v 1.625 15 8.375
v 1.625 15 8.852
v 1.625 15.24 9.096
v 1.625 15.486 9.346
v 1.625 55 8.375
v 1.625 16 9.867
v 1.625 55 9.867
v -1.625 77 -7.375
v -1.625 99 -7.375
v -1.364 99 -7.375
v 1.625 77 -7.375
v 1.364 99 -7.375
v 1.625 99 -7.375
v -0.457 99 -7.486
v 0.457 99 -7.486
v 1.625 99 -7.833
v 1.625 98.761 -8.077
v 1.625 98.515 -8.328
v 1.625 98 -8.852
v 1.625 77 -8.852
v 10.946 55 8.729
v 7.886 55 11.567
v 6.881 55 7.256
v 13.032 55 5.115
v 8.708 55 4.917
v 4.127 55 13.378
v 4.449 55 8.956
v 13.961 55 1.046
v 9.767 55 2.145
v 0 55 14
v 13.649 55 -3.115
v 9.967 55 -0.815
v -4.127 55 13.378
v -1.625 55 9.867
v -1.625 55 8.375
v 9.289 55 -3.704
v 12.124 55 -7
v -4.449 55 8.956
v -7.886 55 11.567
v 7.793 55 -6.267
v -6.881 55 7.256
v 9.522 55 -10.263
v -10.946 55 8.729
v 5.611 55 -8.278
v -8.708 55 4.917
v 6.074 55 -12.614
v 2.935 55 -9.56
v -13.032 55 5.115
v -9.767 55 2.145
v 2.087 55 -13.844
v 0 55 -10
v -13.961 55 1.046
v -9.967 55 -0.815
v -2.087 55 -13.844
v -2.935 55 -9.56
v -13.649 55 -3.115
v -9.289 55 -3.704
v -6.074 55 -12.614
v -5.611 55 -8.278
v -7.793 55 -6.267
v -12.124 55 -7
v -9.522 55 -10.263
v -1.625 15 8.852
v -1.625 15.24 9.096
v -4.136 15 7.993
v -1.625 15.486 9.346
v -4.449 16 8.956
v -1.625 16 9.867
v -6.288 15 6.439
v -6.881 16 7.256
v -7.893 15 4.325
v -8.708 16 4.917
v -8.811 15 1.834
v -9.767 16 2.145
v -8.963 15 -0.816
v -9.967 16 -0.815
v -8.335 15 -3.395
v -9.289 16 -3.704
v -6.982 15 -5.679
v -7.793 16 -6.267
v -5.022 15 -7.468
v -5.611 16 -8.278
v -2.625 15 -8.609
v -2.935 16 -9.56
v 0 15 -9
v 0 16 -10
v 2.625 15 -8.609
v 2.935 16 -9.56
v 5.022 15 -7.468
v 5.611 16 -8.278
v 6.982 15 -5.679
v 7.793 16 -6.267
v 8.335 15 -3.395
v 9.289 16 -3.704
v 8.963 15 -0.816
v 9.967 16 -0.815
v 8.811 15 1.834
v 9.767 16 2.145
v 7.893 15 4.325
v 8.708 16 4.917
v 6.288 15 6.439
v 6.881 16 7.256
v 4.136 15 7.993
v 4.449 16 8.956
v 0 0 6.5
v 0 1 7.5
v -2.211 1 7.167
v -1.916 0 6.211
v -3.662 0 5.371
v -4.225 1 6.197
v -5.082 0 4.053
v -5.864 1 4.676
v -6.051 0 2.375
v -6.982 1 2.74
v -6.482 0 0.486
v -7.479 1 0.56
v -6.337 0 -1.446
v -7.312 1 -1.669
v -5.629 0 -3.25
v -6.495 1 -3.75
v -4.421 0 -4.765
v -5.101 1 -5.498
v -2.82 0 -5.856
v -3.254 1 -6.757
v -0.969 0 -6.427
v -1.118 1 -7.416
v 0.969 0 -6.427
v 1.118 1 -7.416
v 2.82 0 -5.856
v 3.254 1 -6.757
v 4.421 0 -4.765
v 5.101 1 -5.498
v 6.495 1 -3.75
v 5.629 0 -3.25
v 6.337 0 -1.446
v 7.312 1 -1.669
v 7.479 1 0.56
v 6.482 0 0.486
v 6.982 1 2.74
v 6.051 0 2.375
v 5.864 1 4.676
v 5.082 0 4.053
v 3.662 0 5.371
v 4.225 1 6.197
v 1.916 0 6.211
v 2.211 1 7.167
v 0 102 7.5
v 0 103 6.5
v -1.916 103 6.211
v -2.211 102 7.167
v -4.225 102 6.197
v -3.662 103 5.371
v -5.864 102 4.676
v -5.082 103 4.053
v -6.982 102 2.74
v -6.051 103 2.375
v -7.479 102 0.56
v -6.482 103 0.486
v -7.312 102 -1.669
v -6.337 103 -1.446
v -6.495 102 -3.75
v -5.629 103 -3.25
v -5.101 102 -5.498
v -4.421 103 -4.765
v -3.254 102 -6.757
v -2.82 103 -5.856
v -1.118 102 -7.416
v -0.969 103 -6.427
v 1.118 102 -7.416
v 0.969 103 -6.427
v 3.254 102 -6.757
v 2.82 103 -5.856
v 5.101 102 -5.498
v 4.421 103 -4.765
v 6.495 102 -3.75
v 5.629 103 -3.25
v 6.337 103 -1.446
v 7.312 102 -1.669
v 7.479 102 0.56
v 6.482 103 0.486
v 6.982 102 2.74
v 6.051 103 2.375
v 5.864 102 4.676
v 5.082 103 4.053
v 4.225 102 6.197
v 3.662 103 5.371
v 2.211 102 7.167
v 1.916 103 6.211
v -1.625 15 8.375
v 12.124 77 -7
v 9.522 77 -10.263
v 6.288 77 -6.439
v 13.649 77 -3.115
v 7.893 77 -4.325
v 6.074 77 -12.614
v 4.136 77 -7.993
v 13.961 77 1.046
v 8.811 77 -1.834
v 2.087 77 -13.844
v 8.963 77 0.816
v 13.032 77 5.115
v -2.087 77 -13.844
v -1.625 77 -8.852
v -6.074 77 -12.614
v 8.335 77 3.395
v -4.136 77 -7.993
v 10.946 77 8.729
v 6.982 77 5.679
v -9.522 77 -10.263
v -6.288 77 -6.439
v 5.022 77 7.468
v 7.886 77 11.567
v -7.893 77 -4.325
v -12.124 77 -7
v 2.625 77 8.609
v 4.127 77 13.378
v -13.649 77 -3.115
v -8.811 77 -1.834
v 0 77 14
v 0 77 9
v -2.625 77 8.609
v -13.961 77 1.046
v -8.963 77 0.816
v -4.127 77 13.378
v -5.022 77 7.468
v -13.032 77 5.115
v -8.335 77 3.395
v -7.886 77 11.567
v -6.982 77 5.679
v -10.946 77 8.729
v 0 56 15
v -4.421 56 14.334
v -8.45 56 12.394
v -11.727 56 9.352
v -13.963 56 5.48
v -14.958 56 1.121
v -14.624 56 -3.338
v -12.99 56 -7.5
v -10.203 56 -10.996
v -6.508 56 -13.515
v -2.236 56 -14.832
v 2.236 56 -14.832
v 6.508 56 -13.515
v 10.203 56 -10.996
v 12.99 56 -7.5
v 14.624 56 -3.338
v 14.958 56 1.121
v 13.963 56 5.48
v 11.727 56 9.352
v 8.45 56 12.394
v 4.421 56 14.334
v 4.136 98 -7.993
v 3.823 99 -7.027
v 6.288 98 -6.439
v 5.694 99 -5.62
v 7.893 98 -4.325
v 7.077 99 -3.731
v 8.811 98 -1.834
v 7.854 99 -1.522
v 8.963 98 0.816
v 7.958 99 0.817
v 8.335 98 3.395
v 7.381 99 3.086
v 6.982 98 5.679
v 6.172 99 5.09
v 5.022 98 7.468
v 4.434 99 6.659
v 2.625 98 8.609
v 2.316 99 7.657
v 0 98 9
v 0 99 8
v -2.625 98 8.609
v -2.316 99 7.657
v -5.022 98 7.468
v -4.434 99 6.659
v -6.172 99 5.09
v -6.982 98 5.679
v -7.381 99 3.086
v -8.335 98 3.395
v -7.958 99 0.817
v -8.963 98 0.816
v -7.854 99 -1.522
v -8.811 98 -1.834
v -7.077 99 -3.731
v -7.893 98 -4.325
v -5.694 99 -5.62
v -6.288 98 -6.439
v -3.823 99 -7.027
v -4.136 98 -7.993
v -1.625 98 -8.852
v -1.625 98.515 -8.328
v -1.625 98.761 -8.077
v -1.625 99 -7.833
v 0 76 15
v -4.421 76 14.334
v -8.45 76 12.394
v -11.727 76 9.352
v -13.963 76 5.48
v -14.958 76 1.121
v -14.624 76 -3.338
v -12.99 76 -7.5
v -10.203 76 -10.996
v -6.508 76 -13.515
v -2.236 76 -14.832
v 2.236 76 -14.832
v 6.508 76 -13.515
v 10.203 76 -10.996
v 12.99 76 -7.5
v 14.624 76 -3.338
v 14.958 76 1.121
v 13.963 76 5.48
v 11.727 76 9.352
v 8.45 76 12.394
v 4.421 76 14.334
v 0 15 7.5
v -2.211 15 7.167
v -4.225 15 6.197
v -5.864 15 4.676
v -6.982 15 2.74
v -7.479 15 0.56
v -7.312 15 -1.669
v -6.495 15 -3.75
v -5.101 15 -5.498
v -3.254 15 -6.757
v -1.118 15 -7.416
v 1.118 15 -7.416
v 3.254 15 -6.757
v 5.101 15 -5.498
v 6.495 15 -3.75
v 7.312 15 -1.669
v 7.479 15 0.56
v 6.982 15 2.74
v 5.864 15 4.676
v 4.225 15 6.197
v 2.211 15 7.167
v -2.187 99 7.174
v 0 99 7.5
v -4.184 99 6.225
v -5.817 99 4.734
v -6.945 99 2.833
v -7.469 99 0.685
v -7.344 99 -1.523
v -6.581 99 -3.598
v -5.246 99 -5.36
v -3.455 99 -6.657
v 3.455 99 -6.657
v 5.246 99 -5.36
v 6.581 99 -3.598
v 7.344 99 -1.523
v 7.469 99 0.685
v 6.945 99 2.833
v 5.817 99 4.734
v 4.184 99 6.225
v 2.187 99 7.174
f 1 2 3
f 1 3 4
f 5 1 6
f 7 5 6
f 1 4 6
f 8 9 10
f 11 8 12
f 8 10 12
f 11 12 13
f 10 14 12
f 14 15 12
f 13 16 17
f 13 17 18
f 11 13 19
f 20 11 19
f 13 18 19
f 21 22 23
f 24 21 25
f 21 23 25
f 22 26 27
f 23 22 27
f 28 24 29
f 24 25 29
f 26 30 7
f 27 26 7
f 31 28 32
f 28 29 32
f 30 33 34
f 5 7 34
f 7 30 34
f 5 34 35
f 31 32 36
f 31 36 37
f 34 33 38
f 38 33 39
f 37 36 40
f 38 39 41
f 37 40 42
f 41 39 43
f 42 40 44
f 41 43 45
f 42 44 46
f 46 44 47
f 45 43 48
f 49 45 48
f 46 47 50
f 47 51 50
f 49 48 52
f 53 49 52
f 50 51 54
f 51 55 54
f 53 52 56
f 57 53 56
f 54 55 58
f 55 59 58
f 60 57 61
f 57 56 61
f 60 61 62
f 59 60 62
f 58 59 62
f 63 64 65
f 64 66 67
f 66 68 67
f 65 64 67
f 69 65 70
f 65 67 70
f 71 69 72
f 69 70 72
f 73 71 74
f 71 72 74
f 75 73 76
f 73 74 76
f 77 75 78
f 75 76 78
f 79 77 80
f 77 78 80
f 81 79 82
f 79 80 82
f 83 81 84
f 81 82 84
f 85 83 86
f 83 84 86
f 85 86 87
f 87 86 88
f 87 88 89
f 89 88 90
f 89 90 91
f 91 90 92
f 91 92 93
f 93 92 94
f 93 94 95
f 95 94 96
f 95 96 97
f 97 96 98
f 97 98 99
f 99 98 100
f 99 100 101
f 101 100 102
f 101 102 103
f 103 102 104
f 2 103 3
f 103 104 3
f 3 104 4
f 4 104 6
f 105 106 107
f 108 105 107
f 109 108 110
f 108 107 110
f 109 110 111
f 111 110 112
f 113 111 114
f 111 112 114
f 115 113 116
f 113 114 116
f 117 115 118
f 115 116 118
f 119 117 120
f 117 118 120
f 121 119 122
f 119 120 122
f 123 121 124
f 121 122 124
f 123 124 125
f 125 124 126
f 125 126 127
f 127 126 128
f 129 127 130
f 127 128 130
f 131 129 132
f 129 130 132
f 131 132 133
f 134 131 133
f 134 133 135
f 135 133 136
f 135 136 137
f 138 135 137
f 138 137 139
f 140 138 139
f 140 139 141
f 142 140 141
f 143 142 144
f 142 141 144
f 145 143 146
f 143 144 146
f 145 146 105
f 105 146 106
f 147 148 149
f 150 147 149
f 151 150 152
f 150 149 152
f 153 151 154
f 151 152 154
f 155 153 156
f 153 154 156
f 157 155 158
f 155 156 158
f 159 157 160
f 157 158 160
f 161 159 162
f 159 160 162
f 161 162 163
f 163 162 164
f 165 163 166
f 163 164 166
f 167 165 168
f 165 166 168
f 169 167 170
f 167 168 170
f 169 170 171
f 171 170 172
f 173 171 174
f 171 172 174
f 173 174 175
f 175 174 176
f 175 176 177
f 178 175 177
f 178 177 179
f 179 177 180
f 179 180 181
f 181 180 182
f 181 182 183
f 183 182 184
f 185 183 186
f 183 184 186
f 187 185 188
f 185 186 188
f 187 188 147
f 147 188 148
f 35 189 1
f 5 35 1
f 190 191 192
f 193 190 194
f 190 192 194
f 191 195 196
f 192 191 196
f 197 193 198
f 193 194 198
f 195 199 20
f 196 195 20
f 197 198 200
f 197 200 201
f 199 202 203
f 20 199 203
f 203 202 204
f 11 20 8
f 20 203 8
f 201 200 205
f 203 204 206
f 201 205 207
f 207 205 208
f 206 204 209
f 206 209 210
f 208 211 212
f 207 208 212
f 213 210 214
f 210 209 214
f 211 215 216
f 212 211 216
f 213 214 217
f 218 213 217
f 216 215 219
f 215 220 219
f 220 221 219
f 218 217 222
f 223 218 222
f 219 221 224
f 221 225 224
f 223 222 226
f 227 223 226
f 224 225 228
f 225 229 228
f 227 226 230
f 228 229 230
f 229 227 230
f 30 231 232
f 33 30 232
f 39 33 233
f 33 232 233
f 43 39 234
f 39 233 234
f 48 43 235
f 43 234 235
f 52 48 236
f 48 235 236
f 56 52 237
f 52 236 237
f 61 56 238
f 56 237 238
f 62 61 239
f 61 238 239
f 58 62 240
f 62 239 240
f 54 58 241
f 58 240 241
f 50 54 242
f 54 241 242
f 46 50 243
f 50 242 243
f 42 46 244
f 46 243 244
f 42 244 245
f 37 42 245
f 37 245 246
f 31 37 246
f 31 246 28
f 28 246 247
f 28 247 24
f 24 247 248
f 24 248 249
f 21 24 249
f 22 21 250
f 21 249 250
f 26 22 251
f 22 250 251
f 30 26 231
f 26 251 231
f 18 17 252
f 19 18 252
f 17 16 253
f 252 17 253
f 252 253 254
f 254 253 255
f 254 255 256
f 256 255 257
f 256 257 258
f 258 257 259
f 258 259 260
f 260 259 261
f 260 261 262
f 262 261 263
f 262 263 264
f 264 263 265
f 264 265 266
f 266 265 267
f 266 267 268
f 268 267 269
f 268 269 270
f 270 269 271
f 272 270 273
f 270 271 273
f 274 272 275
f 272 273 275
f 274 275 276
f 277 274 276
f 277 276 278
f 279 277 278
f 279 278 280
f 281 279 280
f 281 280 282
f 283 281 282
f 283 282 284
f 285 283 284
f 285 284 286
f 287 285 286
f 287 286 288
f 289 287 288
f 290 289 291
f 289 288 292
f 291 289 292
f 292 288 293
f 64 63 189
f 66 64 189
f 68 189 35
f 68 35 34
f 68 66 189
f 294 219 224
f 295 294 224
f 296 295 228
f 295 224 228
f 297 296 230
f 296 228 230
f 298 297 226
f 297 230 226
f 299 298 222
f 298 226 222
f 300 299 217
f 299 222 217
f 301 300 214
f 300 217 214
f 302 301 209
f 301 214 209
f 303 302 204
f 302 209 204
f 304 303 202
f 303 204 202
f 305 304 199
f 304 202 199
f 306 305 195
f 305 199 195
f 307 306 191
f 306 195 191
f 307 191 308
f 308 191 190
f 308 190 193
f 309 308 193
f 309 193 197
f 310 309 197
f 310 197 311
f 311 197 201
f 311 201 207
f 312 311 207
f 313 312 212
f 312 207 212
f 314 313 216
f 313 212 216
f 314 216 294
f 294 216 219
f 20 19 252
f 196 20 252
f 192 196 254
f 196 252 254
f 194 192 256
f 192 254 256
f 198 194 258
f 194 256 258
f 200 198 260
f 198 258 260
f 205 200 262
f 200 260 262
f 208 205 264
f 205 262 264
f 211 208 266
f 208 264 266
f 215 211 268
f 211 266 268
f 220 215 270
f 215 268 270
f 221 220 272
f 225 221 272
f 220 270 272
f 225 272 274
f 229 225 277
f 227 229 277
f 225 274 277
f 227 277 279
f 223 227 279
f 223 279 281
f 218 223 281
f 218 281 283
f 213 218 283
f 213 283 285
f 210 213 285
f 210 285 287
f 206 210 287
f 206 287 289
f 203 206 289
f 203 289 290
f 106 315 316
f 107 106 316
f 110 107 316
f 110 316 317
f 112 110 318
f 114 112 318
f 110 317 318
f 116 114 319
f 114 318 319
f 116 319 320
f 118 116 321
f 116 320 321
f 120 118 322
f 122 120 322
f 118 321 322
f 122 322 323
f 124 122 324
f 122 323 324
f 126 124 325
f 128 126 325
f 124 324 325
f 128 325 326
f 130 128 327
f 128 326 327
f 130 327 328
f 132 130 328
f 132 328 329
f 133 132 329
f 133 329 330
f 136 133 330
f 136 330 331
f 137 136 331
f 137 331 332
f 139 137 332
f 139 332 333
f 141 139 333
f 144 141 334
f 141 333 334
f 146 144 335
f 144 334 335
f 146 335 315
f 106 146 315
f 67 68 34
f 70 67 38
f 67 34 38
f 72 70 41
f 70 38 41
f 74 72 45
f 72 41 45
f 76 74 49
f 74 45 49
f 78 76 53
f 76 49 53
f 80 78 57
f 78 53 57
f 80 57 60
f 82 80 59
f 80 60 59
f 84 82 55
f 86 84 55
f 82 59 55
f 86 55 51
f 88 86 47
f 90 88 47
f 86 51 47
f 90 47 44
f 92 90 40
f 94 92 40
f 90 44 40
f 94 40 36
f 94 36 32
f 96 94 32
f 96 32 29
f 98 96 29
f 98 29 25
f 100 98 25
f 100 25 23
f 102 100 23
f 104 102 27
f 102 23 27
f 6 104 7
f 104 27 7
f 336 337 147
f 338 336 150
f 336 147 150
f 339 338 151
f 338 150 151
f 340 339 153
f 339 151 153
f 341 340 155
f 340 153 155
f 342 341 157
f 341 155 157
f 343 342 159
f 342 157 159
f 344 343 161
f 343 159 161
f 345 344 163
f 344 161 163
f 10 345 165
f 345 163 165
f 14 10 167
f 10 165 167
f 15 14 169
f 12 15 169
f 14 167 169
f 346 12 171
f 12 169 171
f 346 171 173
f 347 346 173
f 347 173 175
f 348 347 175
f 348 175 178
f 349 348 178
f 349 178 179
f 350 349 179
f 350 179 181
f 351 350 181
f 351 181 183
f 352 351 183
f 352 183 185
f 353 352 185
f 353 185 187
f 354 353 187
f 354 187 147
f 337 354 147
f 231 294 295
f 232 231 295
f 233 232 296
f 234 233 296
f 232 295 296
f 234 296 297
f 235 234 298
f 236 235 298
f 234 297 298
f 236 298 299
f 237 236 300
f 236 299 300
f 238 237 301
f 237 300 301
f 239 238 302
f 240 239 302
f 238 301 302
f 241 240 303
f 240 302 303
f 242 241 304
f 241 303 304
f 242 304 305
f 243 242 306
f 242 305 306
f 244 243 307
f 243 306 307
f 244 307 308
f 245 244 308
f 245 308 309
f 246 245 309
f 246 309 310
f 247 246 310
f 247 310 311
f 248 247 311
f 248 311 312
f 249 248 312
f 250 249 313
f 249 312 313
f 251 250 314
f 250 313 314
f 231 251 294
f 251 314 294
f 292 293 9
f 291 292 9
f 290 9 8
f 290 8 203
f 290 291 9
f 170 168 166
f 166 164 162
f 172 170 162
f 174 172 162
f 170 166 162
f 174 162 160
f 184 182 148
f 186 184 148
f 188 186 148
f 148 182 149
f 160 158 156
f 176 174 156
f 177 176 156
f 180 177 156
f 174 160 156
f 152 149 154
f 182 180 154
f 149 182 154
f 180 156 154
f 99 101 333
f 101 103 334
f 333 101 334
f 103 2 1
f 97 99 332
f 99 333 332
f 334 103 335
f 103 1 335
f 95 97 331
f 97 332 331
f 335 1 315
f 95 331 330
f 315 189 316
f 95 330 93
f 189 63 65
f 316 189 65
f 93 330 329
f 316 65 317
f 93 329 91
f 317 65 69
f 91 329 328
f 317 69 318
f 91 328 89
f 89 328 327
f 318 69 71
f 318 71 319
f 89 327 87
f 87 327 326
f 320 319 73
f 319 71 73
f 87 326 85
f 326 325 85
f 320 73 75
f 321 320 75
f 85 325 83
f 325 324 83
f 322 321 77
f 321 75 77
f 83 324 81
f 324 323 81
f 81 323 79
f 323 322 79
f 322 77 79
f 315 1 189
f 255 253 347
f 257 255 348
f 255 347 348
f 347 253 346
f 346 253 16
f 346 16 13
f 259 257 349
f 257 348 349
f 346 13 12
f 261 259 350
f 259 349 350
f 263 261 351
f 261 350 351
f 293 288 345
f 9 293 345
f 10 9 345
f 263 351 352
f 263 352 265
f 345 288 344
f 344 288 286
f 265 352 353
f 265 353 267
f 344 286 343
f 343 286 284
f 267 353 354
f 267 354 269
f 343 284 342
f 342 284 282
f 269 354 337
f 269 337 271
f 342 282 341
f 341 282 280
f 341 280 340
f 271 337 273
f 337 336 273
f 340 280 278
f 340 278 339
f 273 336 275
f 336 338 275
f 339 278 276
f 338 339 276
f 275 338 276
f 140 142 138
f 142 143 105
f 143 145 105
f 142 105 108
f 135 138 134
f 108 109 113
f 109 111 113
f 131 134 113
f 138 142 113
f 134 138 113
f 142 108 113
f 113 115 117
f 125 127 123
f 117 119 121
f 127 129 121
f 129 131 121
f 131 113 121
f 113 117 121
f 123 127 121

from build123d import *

# Parameters (mm, degrees)
SKETCH2_W          = 3.25
SKETCH2_H          = 3.25
CUT_EXTRUDE1_DEPTH = 40
CHAMFER1_SIZE      = 1
SKETCH3_W          = 3.25
SKETCH3_H          = 3.25
CUT_EXTRUDE2_DEPTH = 22


with BuildPart() as part:
    # Sketch1 → Revolve1 (revolve)
    with BuildSketch(Plane.XY, mode=Mode.PRIVATE) as revolve1_sk:
        Polygon((0, 0), (7.5, 0), (7.5, 15), (10, 15), (10, 55), (15, 55), (15, 77), (9, 77), (9, 99), (7.5, 99), (7.5, 103), (0, 103), align=None)
    revolve(revolve1_sk.sketch.rotate(Axis((0, 103, 0), (0, -1, 0)), 90), axis=Axis((0, 103, 0), (0, -1, 0)))

    # Sketch2 → Cut-Extrude1 (cut)
    with BuildSketch(Plane.XZ.offset(-15)):
        with Locations((0, 10)):
            Rectangle(SKETCH2_W, SKETCH2_H)
    extrude(amount=-CUT_EXTRUDE1_DEPTH, mode=Mode.SUBTRACT)

    # Chamfer1
    chamfer1_edges = [part.edges().sort_by_distance(p)[0] for p in [
        (0, 77, -15),
        (0, 55, -15),
        (0, 15, -10),
        (0, 0, -7.5),
        (0, 103, -7.5),
        (0, 99, -9),
    ]]
    chamfer(chamfer1_edges, length=CHAMFER1_SIZE)

    # Sketch3 → Cut-Extrude2 (cut)
    with BuildSketch(Plane(origin=(0, 99, 0), x_dir=(1, 0, 0), z_dir=(0, 1, 0))):
        with Locations((0, 9)):
            Rectangle(SKETCH3_W, SKETCH3_H)
    extrude(amount=-CUT_EXTRUDE2_DEPTH, mode=Mode.SUBTRACT)


solid = part.part
